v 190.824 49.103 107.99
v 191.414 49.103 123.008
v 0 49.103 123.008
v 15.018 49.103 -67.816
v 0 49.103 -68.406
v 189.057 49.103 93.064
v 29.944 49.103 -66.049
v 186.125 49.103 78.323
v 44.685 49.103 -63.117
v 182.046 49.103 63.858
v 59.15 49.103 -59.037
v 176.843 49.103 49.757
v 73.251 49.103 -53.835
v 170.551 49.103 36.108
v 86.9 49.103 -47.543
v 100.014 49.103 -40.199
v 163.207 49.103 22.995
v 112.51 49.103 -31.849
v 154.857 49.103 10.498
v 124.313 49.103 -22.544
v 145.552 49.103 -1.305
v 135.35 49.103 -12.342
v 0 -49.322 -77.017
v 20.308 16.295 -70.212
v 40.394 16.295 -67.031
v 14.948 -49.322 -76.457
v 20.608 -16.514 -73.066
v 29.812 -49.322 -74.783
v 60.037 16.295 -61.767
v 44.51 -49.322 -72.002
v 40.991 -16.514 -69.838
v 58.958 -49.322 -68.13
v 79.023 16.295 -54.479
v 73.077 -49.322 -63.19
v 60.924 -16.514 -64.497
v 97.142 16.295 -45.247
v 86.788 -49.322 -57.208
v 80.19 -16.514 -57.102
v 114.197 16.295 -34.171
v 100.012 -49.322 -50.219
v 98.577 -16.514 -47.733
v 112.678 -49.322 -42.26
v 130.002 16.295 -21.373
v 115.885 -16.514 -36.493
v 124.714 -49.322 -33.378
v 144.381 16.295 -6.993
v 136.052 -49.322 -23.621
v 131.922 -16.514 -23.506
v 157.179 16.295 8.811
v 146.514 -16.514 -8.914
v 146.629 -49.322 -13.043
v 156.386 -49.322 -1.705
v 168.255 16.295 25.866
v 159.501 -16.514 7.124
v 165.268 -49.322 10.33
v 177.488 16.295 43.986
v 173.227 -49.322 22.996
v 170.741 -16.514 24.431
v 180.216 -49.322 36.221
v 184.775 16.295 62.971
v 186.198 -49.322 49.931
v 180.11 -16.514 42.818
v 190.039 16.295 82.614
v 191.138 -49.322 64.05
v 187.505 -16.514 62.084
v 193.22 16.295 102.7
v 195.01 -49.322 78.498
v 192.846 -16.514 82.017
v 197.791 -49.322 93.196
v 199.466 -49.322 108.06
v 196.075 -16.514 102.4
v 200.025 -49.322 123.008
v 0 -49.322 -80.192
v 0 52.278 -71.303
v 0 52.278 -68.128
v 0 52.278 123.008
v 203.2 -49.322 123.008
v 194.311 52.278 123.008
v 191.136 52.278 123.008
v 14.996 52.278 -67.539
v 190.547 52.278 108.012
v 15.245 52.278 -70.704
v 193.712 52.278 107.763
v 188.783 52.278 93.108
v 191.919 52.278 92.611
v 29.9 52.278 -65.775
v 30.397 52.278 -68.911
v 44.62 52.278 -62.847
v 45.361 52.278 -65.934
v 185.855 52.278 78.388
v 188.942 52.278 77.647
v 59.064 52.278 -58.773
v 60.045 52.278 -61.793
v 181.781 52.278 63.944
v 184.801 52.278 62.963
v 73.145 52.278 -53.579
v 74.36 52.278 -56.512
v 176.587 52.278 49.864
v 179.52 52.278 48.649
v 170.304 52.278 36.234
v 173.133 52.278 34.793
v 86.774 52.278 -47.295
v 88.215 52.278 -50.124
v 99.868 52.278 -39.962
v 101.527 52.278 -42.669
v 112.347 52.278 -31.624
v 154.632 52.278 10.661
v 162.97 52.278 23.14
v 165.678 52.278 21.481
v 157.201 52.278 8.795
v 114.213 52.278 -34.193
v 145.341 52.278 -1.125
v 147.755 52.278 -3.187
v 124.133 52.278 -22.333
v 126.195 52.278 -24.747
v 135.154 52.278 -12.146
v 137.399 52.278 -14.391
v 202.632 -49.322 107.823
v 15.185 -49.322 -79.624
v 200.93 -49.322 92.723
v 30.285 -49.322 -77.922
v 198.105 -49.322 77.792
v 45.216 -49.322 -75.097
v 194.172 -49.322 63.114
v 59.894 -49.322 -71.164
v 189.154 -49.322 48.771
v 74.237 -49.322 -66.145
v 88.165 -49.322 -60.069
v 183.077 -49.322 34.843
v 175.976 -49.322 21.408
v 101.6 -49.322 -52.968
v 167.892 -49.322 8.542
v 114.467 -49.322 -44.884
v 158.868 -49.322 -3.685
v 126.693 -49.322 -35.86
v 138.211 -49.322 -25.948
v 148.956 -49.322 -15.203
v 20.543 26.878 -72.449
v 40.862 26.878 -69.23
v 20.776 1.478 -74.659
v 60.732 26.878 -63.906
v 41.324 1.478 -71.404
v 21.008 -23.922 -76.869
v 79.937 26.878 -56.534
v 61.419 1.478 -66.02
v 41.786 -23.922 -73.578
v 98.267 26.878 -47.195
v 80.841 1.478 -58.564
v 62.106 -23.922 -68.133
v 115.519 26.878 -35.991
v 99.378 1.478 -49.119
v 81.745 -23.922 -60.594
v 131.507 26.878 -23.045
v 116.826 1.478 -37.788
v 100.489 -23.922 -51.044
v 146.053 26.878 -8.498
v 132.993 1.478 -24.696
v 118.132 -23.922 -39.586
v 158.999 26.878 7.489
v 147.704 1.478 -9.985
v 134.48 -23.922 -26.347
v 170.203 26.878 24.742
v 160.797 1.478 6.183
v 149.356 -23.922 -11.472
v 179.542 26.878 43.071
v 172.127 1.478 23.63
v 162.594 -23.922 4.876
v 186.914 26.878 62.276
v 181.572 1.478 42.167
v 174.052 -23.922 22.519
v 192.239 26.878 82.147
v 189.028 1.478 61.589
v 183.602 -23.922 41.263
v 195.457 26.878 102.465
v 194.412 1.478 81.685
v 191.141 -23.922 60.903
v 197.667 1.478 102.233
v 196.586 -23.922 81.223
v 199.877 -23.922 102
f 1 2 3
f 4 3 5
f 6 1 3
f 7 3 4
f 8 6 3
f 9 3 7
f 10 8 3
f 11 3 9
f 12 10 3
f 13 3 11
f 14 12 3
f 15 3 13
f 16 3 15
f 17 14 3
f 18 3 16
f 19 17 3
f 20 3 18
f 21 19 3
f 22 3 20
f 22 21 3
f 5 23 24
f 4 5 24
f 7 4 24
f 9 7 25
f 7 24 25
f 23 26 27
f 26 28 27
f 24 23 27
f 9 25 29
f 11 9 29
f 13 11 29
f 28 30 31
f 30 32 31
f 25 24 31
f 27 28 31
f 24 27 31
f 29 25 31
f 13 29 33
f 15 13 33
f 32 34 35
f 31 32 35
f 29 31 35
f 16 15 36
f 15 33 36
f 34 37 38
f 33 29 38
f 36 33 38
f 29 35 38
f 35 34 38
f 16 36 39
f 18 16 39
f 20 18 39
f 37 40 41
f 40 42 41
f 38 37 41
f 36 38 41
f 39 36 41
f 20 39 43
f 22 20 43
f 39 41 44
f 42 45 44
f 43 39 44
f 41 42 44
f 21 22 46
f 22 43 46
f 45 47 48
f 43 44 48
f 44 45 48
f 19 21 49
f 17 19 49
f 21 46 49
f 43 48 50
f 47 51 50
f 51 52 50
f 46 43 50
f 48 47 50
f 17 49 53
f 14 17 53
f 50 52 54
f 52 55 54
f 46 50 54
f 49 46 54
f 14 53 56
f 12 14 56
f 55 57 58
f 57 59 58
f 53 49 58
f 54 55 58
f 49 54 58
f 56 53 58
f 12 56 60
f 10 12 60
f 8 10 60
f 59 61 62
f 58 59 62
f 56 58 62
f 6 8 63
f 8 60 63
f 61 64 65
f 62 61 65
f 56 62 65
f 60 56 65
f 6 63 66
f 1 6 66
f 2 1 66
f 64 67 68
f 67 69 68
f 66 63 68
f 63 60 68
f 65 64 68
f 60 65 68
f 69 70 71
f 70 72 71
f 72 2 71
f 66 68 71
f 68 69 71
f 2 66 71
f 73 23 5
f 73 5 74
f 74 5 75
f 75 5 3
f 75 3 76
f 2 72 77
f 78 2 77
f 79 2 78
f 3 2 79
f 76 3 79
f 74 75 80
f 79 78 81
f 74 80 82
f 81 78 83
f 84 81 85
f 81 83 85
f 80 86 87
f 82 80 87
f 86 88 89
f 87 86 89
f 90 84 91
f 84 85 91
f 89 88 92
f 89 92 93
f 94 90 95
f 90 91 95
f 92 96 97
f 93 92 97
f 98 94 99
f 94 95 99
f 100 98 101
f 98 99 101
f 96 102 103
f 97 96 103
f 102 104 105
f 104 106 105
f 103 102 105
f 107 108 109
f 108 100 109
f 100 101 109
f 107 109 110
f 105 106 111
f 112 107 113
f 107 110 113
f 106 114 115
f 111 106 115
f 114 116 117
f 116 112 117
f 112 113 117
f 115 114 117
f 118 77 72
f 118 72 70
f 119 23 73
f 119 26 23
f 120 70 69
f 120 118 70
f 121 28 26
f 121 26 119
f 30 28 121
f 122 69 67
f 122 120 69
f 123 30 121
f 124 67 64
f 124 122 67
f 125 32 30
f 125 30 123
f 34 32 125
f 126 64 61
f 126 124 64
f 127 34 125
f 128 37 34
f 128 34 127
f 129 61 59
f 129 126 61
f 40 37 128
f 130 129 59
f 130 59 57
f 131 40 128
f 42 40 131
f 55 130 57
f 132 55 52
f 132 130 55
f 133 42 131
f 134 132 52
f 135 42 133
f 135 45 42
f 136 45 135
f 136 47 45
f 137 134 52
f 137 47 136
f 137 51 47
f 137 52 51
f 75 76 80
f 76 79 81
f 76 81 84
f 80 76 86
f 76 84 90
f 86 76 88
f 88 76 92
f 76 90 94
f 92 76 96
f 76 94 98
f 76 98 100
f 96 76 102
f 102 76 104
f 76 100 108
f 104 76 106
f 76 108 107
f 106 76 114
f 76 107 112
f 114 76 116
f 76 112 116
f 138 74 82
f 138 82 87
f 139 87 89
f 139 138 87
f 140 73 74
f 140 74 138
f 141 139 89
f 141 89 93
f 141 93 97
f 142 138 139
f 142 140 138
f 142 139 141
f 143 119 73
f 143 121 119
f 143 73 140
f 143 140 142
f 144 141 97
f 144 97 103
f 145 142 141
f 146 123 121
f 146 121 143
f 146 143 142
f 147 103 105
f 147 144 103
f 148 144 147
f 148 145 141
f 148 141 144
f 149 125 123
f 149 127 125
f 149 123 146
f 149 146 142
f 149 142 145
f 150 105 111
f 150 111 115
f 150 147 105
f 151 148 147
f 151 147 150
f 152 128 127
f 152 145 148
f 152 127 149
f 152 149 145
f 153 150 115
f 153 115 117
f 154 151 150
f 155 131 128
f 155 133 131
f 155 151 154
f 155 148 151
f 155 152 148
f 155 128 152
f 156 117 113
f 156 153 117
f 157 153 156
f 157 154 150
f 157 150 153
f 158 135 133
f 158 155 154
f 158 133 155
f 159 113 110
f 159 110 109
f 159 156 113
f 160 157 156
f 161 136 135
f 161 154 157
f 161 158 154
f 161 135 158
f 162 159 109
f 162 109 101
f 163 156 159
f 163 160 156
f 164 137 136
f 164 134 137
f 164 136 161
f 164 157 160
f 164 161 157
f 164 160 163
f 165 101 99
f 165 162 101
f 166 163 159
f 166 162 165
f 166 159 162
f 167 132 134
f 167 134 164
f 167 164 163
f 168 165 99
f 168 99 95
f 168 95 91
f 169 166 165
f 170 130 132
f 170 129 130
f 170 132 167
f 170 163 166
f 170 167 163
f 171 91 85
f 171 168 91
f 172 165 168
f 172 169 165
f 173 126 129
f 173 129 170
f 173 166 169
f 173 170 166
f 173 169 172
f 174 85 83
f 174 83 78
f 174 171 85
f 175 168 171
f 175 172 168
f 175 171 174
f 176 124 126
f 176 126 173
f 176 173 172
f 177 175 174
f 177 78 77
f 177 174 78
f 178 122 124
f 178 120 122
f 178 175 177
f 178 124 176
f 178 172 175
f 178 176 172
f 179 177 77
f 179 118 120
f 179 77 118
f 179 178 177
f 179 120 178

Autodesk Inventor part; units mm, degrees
ref_plane "YZ Plane" through (0, 0, 0) normal (1, 0, 0) x (0, 1, 0)
ref_plane "XZ Plane" through (0, 0, 0) normal (0, 1, 0) x (-1, 0, 0)
ref_plane "XY Plane" through (0, 0, 0) normal (0, 0, 1) x (1, 0, 0)
sketch "Sketch1" plane through (0, 0, 0) normal (1, 0, 0) x (0, 1, 0)
  line L0 (52.2781, 123.0082) -> (49.1031, 123.0082)
  line L1 (-49.3219, -80.1918) -> (-49.3219, -77.0168)
  line L2 (-49.3219, -77.0168) -> (49.1031, -68.4058)
  line L3 (52.2781, -68.128) -> (52.2781, -71.303)
  line L4 (-49.3219, -80.1918) -> (52.2781, -71.303)
  line L5 (52.2781, -68.128) -> (52.2781, 123.0082)
  line L6 (49.1031, 123.0082) -> (49.1031, -68.4058)
  point P0 (0, 0)
  dimension "d0" = 203.2
  dimension "d1" = 3.175
  dimension "d2" = 95
  dimension "d3" = 101.6
  dimension "d4" = 180
  dimension "d5" = 3.175
revolve "Revolution1" add sketch "Sketch1" angle 90 about axis through (0, 52.2781, 123.0082) along (0, -1, 0)
properties part number "QuarterTop"
